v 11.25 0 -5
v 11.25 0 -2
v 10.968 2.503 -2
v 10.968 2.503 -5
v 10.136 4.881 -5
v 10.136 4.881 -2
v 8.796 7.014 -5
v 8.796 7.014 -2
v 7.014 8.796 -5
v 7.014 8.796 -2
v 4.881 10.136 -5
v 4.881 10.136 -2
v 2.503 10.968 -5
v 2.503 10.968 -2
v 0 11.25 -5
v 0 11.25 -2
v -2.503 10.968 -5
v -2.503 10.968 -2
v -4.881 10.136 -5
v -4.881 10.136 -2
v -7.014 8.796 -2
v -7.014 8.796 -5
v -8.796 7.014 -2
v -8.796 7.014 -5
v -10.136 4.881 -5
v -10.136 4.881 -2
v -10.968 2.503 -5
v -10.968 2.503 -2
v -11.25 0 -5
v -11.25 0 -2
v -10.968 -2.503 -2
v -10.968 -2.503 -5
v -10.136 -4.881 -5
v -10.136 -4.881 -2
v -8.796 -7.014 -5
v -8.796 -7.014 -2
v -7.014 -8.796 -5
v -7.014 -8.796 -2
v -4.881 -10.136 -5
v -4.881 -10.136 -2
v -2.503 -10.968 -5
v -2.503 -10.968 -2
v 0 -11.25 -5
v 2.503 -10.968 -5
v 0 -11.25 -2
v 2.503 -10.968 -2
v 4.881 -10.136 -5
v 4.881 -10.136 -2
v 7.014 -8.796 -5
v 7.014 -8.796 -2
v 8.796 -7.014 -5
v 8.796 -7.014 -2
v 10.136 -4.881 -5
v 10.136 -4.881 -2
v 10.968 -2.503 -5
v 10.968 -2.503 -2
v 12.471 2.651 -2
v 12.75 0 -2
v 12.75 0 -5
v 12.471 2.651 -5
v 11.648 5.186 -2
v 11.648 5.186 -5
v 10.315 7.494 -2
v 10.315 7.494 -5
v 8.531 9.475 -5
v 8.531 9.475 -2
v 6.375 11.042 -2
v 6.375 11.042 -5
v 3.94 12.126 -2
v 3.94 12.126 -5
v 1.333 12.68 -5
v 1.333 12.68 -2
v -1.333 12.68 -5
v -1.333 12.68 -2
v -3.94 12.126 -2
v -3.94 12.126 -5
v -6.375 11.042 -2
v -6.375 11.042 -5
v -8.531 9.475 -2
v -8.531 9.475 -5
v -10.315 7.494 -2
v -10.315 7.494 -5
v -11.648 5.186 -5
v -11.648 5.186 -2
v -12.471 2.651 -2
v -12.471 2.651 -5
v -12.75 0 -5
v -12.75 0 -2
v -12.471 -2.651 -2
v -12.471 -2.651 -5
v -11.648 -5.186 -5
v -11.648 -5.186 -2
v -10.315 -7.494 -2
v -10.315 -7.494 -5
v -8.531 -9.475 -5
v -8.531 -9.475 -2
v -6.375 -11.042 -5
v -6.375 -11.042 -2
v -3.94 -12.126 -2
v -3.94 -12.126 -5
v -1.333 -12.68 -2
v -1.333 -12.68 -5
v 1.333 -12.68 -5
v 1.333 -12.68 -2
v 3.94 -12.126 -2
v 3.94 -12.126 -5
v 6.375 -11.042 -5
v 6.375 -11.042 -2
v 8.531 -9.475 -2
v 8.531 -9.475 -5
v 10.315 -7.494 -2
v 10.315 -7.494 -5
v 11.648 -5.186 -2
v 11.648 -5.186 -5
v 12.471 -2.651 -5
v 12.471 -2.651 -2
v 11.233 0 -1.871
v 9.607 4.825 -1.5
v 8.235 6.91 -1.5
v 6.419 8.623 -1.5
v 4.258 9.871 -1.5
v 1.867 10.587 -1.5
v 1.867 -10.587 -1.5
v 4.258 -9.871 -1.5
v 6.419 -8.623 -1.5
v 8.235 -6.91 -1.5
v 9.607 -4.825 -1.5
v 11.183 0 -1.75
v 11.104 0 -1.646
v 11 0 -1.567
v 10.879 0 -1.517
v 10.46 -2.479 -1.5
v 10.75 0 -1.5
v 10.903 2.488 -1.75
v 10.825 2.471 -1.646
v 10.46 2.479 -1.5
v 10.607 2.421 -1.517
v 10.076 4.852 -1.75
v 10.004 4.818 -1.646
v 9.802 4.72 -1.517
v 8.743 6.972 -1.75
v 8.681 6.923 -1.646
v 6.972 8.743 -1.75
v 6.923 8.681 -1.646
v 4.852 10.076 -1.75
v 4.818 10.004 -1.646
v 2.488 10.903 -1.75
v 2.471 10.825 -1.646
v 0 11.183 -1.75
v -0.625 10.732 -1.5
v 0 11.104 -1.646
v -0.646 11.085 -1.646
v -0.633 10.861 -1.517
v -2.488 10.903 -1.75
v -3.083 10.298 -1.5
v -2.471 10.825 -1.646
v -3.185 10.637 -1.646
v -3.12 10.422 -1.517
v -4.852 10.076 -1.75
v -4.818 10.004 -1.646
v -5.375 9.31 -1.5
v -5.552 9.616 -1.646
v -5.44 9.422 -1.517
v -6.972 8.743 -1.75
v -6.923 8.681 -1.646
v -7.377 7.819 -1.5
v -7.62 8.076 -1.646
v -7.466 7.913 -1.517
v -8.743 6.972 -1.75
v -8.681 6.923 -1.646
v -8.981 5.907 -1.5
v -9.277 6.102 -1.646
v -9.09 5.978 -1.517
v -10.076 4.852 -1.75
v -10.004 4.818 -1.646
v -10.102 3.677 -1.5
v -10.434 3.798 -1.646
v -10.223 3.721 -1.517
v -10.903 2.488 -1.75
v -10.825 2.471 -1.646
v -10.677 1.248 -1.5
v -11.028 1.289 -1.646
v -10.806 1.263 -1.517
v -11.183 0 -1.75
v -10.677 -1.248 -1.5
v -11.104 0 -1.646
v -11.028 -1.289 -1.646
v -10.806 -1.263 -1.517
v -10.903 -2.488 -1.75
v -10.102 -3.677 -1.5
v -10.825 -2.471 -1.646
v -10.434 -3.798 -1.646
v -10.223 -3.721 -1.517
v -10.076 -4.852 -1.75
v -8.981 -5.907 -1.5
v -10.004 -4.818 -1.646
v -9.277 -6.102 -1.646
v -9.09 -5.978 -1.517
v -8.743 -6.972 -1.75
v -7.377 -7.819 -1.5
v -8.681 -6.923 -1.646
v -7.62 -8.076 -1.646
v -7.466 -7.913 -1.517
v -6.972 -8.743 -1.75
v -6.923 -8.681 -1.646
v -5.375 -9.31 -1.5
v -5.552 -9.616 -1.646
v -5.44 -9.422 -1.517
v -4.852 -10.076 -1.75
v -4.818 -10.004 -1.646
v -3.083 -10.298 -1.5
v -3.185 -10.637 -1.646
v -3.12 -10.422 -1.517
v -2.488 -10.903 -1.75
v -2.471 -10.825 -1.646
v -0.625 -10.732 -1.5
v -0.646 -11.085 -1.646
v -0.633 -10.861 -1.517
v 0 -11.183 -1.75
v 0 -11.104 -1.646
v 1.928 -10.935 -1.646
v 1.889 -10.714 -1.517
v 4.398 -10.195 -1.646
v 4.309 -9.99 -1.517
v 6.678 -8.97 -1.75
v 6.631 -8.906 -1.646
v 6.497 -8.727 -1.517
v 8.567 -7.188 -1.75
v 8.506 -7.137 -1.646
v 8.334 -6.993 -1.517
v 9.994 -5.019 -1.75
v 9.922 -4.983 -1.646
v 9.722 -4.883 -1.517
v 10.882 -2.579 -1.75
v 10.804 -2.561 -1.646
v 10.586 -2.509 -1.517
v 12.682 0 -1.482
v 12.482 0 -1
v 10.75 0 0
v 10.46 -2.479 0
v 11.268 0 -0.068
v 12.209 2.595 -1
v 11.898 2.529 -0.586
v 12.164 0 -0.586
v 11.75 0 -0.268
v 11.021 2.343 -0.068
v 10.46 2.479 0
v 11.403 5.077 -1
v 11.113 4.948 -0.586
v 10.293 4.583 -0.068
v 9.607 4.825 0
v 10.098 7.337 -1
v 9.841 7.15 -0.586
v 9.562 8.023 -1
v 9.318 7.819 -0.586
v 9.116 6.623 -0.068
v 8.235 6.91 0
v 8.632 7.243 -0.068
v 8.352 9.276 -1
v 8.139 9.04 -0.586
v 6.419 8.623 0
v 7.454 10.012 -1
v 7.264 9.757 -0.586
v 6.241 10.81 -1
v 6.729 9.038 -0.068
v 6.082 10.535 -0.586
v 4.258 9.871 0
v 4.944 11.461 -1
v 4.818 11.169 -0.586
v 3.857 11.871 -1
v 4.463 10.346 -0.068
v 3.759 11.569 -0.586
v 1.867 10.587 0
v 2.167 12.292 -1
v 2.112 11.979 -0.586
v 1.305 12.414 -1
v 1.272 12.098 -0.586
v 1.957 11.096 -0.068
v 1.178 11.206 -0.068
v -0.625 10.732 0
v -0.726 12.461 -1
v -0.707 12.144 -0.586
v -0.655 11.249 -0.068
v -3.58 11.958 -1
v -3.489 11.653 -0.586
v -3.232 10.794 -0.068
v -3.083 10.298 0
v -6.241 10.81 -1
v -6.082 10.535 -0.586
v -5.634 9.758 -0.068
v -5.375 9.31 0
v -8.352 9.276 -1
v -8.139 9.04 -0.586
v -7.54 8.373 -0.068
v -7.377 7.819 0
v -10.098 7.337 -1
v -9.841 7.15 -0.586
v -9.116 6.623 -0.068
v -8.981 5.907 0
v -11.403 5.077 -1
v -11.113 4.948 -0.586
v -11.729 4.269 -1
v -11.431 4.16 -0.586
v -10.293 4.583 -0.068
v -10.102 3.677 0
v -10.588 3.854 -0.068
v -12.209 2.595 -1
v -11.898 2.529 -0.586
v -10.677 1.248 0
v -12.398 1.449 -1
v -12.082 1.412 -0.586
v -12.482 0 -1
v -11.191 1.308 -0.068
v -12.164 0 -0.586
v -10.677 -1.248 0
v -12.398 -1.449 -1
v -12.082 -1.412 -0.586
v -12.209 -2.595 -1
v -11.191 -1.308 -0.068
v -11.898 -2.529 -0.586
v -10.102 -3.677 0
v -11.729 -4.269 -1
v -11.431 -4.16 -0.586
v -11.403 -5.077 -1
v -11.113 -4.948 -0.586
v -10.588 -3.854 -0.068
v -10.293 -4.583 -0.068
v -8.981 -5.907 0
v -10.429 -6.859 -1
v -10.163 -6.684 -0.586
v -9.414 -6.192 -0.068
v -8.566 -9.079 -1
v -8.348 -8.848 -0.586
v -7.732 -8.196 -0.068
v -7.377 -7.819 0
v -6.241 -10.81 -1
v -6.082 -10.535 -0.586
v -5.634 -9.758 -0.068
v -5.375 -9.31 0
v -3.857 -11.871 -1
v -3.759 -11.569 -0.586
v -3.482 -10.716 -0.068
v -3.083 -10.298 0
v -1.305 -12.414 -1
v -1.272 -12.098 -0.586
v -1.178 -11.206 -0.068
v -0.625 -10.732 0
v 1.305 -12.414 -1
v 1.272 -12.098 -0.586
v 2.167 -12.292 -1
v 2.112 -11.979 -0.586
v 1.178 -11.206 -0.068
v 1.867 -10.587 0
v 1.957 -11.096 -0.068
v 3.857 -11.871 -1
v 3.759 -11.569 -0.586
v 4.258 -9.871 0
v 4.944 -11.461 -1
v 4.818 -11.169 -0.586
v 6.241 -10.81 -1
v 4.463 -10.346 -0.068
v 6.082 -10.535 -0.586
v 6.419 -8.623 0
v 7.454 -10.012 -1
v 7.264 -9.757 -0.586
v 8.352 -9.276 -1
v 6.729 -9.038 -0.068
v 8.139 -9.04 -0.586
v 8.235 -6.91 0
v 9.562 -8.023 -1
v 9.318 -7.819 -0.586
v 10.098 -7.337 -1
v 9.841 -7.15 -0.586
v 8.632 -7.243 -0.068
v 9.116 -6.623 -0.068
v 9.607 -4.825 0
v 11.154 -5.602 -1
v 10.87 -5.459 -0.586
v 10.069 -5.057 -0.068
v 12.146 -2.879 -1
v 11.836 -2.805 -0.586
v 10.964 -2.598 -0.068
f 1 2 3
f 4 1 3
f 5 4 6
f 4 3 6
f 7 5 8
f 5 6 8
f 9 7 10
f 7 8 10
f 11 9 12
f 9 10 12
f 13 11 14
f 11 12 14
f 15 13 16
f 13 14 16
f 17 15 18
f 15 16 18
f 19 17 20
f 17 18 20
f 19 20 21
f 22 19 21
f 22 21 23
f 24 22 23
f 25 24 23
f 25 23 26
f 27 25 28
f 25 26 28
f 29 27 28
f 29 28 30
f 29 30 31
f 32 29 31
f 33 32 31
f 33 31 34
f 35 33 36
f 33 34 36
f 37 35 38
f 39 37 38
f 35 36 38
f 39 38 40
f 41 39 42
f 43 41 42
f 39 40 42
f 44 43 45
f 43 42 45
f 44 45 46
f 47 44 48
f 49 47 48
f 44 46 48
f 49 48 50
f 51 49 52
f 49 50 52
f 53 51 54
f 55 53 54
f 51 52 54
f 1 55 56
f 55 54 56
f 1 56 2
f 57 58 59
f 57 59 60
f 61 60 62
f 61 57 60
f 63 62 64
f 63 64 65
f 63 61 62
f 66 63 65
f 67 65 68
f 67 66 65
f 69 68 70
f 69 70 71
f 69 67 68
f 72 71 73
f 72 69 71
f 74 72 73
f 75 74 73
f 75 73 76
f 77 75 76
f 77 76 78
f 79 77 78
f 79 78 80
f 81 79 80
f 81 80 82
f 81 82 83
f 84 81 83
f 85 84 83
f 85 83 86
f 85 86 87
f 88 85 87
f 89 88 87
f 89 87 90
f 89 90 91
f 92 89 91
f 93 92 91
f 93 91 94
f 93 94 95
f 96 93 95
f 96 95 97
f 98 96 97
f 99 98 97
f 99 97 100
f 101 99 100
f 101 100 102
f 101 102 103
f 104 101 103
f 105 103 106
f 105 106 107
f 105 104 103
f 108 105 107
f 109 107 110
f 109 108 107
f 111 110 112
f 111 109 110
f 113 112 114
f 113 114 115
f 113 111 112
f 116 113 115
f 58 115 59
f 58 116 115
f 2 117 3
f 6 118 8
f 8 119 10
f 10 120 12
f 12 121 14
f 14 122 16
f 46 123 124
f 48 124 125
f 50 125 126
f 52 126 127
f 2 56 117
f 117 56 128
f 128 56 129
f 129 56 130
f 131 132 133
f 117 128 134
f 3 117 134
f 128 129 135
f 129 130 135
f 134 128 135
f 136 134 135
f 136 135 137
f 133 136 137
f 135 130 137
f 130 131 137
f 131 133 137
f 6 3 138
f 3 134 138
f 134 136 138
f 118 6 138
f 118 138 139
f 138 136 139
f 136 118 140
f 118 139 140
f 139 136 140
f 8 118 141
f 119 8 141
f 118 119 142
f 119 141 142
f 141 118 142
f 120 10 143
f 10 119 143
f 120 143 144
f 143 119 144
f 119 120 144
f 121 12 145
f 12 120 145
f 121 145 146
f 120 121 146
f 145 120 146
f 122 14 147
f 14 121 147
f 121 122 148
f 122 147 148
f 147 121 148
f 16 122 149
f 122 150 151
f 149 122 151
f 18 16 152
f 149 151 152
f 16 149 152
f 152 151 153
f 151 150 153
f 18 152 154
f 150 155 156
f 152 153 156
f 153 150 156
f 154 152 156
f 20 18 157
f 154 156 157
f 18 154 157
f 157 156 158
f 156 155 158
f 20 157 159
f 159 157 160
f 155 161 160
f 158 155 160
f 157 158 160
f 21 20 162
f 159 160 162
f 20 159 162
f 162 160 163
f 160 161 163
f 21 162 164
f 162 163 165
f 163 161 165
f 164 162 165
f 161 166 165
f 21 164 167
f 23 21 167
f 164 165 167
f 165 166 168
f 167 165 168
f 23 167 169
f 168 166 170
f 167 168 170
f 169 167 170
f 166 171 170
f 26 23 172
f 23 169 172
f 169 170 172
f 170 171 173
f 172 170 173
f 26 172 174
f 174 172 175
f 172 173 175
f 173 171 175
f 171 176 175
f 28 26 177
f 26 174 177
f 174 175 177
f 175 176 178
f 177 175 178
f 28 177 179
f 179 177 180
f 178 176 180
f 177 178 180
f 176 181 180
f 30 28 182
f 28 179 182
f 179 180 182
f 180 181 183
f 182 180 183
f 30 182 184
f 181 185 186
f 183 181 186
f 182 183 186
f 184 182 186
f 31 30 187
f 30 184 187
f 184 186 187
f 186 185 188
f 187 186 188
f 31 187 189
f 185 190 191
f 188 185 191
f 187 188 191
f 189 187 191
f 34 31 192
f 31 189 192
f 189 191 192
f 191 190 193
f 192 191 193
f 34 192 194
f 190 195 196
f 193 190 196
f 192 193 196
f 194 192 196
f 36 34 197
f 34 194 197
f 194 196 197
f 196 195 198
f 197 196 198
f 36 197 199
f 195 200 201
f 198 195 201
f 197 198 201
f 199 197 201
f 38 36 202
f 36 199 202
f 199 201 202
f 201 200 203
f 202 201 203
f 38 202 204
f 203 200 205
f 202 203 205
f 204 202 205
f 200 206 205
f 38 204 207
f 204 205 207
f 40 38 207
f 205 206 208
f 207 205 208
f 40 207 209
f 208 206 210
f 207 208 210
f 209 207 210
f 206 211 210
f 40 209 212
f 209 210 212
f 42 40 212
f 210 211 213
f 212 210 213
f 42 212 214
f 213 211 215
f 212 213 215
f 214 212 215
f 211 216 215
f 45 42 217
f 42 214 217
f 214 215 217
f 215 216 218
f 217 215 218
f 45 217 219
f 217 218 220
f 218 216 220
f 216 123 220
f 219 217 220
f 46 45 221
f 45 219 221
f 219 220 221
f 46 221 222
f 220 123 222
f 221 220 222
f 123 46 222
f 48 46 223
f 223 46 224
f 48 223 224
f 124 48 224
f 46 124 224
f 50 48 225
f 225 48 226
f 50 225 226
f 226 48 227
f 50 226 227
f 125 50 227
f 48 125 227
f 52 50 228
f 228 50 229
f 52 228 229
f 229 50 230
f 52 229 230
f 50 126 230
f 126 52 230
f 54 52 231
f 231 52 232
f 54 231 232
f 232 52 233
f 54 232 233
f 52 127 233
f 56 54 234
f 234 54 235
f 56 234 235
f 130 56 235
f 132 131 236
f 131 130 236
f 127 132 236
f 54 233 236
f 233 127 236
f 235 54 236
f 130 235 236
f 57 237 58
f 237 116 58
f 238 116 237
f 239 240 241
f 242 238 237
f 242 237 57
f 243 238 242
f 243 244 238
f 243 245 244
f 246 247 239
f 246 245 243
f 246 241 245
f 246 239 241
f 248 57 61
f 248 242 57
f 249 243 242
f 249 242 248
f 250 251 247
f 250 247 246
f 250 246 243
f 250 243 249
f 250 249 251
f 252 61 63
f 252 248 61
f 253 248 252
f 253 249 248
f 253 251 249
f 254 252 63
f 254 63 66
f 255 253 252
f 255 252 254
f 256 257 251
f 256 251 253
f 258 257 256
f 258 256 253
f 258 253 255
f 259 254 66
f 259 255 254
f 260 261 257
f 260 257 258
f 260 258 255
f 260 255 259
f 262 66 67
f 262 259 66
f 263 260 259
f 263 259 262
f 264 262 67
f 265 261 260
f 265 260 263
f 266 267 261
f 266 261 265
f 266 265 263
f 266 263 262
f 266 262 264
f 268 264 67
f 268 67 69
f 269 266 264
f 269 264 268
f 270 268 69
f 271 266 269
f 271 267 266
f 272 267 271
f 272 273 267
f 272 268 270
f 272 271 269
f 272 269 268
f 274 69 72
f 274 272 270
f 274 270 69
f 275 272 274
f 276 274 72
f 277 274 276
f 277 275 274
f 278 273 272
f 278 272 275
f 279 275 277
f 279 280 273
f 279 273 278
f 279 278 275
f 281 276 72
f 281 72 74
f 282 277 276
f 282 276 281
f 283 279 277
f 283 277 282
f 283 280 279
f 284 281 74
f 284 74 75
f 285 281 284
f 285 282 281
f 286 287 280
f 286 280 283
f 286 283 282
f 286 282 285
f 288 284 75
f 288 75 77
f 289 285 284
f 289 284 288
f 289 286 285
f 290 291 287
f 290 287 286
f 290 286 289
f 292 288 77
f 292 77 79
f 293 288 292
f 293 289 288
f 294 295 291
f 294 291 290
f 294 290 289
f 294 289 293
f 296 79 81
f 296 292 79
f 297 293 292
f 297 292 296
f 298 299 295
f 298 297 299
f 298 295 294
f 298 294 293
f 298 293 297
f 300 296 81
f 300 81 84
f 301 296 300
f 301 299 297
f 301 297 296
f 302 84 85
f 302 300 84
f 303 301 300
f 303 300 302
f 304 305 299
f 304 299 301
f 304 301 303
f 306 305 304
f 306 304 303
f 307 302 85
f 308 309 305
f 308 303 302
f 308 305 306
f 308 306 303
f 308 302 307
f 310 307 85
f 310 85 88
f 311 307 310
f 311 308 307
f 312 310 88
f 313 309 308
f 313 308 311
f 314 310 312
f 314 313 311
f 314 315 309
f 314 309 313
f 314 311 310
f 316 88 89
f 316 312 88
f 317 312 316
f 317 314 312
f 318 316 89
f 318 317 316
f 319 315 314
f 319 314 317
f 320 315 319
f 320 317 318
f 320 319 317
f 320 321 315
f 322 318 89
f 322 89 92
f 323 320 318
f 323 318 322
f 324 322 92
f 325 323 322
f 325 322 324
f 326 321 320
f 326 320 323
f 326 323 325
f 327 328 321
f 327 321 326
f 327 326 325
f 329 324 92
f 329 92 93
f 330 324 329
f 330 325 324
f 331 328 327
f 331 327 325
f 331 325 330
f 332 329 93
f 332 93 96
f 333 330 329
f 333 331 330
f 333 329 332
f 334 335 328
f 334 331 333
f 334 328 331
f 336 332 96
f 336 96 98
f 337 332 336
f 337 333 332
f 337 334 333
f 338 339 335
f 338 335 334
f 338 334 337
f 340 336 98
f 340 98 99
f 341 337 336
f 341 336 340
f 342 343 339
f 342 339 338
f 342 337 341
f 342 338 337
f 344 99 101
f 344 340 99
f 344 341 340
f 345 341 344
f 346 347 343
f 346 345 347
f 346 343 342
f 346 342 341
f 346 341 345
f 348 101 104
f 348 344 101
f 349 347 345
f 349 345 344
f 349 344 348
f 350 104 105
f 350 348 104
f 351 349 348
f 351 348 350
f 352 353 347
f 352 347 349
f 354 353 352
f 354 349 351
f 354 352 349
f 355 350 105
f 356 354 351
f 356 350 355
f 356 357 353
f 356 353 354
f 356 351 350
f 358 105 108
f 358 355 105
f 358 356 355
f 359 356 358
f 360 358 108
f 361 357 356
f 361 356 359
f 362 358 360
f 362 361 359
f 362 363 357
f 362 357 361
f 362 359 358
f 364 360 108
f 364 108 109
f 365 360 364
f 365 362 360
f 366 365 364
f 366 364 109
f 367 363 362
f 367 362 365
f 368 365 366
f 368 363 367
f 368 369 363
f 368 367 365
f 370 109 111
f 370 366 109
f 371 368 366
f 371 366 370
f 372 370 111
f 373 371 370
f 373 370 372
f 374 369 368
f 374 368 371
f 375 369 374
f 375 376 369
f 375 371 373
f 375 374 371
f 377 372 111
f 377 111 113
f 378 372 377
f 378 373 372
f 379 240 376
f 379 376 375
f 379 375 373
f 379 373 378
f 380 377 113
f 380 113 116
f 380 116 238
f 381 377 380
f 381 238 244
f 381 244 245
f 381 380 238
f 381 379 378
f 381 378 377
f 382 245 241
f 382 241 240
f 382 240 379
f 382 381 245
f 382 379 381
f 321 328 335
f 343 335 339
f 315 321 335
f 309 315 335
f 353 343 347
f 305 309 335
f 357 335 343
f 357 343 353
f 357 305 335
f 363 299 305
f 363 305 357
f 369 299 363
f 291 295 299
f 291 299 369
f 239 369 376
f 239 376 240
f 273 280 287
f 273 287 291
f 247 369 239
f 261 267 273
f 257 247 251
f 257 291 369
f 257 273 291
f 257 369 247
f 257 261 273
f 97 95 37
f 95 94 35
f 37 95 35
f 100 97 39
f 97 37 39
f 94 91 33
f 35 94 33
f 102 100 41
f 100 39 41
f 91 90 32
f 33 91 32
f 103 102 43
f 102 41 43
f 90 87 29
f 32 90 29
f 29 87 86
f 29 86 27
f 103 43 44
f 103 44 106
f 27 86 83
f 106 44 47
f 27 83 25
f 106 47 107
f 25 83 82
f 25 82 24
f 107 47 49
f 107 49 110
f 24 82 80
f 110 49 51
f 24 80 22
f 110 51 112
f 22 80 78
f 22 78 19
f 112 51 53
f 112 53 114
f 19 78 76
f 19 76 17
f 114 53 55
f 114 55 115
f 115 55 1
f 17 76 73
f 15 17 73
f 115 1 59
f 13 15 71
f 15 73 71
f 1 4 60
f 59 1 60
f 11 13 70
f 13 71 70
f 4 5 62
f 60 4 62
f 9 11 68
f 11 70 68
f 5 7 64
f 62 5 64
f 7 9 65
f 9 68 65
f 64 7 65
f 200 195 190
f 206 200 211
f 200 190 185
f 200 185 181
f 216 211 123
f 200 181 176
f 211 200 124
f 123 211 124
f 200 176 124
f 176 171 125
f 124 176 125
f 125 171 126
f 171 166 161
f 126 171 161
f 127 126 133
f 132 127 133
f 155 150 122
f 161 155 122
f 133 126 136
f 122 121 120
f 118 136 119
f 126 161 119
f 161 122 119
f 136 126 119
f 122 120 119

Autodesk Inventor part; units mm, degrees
ref_plane "YZ Plane" through (0, 0, 0) normal (1, 0, 0) x (0, 1, 0)
ref_plane "XZ Plane" through (0, 0, 0) normal (0, 1, 0) x (-1, 0, 0)
ref_plane "XY Plane" through (0, 0, 0) normal (0, 0, 1) x (1, 0, 0)
sketch "草图1" plane through (0, 0, 0) normal (0, 0, 1) x (1, 0, 0)
  circle A0 centre (0, 0) radius 12.75
  dimension "d0" = 25.5
extrude "拉伸1" add sketch "草图1" against normal blind 5
fillet "圆角1" radius 2 1 edges at (-12.75, 0, 0)
shell "抽壳1" thickness 1.5 removed faces 1 at (4.8553, -3.9738, -5)
properties part number "Buttonx26" material "玻璃"
